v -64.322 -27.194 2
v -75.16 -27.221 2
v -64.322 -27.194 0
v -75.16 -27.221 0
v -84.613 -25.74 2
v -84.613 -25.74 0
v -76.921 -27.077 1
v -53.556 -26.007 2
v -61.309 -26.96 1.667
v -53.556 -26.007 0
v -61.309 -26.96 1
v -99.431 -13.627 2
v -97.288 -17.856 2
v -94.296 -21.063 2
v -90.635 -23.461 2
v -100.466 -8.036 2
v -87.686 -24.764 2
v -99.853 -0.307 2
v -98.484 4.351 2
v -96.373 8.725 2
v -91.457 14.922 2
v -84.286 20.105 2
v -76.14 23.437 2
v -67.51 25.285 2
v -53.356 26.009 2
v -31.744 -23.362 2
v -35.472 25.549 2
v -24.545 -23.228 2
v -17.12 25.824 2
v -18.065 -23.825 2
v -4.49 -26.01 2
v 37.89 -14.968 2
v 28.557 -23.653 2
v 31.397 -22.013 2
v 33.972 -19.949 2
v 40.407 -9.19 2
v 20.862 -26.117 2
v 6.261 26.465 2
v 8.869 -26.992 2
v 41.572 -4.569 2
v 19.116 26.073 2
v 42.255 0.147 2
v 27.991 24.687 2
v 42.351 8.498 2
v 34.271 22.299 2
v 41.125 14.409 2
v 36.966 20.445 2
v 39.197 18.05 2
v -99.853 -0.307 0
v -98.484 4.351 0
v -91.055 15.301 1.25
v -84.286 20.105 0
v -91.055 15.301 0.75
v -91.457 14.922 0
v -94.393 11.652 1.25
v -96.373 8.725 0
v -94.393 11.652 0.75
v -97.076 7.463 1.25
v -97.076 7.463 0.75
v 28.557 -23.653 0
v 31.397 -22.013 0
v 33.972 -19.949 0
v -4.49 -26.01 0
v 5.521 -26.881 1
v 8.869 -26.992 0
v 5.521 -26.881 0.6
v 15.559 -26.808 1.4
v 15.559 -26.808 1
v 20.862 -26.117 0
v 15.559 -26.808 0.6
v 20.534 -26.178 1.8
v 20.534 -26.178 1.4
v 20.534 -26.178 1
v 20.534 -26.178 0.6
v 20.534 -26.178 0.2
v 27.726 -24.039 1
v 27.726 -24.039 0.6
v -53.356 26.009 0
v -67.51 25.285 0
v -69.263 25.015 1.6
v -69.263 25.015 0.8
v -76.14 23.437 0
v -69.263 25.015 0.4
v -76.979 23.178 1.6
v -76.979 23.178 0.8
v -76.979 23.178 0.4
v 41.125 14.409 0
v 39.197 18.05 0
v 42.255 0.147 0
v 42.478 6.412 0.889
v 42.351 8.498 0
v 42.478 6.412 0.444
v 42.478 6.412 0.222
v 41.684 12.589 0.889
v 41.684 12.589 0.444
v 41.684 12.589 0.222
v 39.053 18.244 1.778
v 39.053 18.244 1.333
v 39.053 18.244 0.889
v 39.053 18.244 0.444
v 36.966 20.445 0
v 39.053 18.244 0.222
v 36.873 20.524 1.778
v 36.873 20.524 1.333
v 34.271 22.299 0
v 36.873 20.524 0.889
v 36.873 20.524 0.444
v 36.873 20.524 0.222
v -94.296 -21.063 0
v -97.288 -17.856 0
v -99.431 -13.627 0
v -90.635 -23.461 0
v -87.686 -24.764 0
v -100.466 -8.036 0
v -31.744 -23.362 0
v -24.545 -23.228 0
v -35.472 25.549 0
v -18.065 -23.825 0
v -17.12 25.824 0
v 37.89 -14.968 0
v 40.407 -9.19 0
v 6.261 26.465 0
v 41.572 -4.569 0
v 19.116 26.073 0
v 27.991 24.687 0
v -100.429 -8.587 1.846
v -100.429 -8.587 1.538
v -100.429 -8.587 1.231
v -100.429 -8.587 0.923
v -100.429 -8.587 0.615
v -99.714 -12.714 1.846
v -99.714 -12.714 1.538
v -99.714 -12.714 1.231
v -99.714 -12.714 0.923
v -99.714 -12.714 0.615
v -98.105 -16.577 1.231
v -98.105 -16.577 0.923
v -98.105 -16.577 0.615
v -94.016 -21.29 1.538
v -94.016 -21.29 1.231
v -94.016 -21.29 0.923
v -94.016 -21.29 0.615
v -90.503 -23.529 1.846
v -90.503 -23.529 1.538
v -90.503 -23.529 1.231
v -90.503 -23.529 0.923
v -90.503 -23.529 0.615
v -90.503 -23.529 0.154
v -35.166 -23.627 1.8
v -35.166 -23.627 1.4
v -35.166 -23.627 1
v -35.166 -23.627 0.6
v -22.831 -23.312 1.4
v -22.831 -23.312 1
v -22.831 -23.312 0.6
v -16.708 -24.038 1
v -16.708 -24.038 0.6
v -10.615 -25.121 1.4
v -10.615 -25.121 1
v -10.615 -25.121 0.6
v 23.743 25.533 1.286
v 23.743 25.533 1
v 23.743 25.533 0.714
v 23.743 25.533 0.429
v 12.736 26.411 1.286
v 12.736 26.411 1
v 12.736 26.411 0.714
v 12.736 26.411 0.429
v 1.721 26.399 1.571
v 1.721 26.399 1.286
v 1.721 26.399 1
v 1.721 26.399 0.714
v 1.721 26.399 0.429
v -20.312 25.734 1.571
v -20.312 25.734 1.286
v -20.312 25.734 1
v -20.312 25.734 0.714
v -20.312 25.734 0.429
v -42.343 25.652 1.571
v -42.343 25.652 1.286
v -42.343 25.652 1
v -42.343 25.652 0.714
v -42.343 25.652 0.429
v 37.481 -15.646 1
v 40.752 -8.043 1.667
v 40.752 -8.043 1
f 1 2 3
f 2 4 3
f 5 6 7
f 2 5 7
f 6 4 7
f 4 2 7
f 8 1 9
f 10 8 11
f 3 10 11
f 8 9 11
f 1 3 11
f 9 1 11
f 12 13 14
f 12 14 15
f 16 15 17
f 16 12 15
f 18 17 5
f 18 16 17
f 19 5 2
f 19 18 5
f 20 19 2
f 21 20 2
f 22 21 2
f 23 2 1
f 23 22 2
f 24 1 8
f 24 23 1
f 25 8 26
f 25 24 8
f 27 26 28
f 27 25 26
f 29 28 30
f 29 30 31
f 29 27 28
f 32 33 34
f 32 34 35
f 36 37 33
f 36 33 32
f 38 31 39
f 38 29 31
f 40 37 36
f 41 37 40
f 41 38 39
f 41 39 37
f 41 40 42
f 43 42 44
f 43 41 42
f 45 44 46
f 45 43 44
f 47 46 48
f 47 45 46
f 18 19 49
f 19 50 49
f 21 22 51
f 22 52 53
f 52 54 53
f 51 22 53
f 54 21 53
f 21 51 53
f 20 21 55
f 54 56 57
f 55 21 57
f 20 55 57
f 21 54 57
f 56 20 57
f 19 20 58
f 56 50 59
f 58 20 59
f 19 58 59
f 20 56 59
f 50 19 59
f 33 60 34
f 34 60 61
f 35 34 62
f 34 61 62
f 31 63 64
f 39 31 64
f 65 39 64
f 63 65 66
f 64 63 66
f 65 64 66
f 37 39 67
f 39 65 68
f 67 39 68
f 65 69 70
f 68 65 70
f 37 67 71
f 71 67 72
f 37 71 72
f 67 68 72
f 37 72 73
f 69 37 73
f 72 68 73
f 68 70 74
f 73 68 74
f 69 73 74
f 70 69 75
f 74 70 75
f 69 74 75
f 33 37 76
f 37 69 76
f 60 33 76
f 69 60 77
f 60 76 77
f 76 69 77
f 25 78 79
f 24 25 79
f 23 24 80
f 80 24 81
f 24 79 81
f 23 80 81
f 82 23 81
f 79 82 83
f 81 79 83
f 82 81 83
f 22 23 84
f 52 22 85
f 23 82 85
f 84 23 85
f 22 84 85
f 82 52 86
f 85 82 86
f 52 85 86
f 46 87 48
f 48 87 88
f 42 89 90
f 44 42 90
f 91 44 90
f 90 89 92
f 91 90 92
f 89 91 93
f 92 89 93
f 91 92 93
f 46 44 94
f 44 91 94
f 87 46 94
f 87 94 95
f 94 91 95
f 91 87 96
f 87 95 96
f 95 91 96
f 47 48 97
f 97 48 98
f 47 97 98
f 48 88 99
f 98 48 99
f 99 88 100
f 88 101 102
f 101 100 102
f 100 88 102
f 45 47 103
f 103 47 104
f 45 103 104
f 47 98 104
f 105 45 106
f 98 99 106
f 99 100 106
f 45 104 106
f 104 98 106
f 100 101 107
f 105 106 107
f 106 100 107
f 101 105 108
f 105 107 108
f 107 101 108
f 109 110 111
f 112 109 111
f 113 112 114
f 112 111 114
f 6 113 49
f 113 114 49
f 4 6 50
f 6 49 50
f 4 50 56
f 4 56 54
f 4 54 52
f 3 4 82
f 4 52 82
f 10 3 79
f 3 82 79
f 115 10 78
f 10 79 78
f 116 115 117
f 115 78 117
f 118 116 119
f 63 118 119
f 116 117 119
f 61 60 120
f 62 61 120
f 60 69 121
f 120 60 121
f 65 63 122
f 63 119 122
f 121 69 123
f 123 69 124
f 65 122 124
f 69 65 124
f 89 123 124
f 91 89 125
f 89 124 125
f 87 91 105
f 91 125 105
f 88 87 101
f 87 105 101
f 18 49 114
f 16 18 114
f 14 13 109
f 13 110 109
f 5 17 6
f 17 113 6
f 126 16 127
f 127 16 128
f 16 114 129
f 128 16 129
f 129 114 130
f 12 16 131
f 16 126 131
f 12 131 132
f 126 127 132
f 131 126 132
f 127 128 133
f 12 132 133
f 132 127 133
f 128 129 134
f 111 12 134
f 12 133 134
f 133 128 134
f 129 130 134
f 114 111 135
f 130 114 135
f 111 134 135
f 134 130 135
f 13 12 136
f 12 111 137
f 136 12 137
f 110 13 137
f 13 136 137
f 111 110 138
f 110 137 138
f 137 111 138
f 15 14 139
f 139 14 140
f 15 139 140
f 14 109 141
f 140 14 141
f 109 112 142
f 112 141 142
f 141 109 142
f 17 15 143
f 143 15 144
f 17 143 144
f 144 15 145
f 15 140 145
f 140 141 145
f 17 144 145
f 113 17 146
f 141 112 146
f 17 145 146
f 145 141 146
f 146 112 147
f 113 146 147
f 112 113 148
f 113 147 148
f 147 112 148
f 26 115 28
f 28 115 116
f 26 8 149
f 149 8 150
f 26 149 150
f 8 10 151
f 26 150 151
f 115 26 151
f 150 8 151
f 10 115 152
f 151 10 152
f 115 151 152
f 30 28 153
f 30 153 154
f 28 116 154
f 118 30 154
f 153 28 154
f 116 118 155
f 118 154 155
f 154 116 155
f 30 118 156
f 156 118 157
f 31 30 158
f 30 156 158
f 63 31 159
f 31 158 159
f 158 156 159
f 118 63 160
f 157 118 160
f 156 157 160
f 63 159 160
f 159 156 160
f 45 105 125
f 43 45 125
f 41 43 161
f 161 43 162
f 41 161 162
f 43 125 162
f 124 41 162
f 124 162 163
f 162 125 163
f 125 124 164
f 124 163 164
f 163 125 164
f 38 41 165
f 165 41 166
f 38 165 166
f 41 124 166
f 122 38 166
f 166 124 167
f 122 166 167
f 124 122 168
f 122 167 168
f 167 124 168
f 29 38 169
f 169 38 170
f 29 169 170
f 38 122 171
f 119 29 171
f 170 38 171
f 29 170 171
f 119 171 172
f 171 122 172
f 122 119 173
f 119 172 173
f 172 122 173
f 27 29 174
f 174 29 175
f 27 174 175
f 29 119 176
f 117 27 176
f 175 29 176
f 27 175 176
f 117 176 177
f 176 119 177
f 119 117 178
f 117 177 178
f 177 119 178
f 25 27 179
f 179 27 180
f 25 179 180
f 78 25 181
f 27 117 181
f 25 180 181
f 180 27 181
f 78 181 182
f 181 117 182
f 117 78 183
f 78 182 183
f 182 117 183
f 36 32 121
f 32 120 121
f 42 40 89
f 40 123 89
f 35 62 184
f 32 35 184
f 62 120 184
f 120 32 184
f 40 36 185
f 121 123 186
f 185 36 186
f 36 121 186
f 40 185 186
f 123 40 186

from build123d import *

# Parameters (mm, degrees)
BOSS_EXTRUDE1_DEPTH = 2


with BuildPart() as part:
    # Sketch1 → Boss-Extrude1 (new body)
    with BuildSketch(Plane.XY):
        with BuildLine():
            add(Edge.make_bspline(
                [(42.254555433, 0.147491636), (42.357527928, 1.189654109), (42.429661522, 2.232689939), (42.50709154, 4.320654428), (42.51255676, 5.365578306), (42.442786882, 7.457711495), (42.367698351, 8.502293443), (42.114292364, 10.564097845), (41.937085255, 11.58438322), (41.430828506, 13.593034081), (41.099175069, 14.581958917), (40.21807674, 16.509553986), (39.685127794, 17.41062061), (38.736453804, 18.660893203), (38.395384144, 19.060783278), (37.662639186, 19.826206877), (37.275770546, 20.18645437), (36.067960398, 21.197855015), (35.196182138, 21.783754372), (34.270812785, 22.298516315)],
                knots=[0, 0, 0, 0, 0.125, 0.125, 0.25, 0.25, 0.375, 0.375, 0.5, 0.5, 0.625, 0.625, 0.75, 0.75, 0.8125, 0.8125, 0.875, 0.875, 1, 1, 1, 1], degree=3))
            add(Edge.make_bspline(
                [(34.270812785, 22.298516315), (33.45091286, 22.754608011), (32.610347852, 23.1435514), (30.899496832, 23.82486392), (30.029089503, 24.116838846), (27.384412134, 24.88405503), (25.576662512, 25.251639126), (21.909570483, 25.814621969), (20.0753308, 26.005227958), (16.406035598, 26.27954802), (14.570970807, 26.362047301), (10.900331001, 26.4601954), (9.06475148, 26.475254024), (5.393277351, 26.464088036), (3.557380256, 26.437537651), (-1.950579769, 26.322675756), (-5.622906828, 26.199757695), (-12.967559425, 25.954120765), (-16.639869453, 25.830255047), (-23.984199611, 25.63861252), (-27.656235207, 25.570366288), (-34.999851743, 25.5306977), (-38.671433692, 25.559060601), (-43.260530776, 25.675514463), (-44.178331243, 25.702840848), (-46.013892062, 25.766036726), (-46.93165263, 25.801860059), (-49.684941646, 25.90777277), (-51.520481355, 25.975464081), (-53.356182015, 26.008878987)],
                knots=[0, 0, 0, 0, 0.03125, 0.03125, 0.0625, 0.0625, 0.125, 0.125, 0.1875, 0.1875, 0.25, 0.25, 0.3125, 0.3125, 0.375, 0.375, 0.5, 0.5, 0.625, 0.625, 0.75, 0.75, 0.875, 0.875, 0.90625, 0.90625, 0.9375, 0.9375, 1, 1, 1, 1], degree=3))
            add(Edge.make_bspline(
                [(-53.356182015, 26.008878987), (-56.017284847, 26.057318531), (-58.67724197, 26.03660848), (-63.99279506, 25.731969361), (-66.637523426, 25.454977459), (-70.576071928, 24.795289884), (-71.878758496, 24.535193979), (-74.451881384, 23.926274503), (-75.723701138, 23.577253526), (-79.488833317, 22.378061694), (-81.932756658, 21.378597323), (-84.285903477, 20.104733327)],
                knots=[0, 0, 0, 0, 0.25, 0.25, 0.5, 0.5, 0.625, 0.625, 0.75, 0.75, 1, 1, 1, 1], degree=3))
            add(Edge.make_bspline(
                [(-84.285903477, 20.104733327), (-86.243668655, 19.04490716), (-88.089328033, 17.819942875), (-90.230085424, 16.043743516), (-90.648741369, 15.677034404), (-91.461012999, 14.925425227), (-91.855498364, 14.539810344), (-93.003741638, 13.353314641), (-93.722322166, 12.522812605), (-95.063439745, 10.780934854), (-95.685998708, 9.869577587), (-96.545075204, 8.439588178), (-96.818228201, 7.953420385), (-97.332937593, 6.972523784), (-97.575368205, 6.476373625), (-98.714832207, 3.96785142), (-99.396532307, 1.873209654), (-99.85314935, -0.307426804)],
                knots=[0, 0, 0, 0, 0.25, 0.25, 0.3125, 0.3125, 0.375, 0.375, 0.5, 0.5, 0.625, 0.625, 0.6875, 0.6875, 0.75, 0.75, 1, 1, 1, 1], degree=3))
            add(Edge.make_bspline(
                [(-99.85314935, -0.307426804), (-100.14051455, -1.679778191), (-100.331986994, -3.055968901), (-100.528564311, -5.815812043), (-100.53708908, -7.199327552), (-100.402537913, -8.934535692), (-100.368287375, -9.281871208), (-100.283421356, -9.977197456), (-100.232649746, -10.326034758), (-100.055206061, -11.363139778), (-99.903283497, -12.04419862), (-99.525579806, -13.383595412), (-99.29967189, -14.04189436), (-98.764969227, -15.332994025), (-98.453321931, -15.970026404), (-97.409175926, -17.7896486), (-96.565970976, -18.891117915), (-95.090785963, -20.383706122), (-94.562489524, -20.855363909), (-93.469619231, -21.72400101), (-92.901743324, -22.124781656), (-91.729150022, -22.868715032), (-91.124315887, -23.211685156), (-89.881965149, -23.846503081), (-89.242471007, -24.139085478), (-87.298729798, -24.941242749), (-85.968550779, -25.377452728), (-84.61265543, -25.739877353)],
                knots=[0, 0, 0, 0, 0.125, 0.125, 0.25, 0.25, 0.28125, 0.28125, 0.3125, 0.3125, 0.375, 0.375, 0.4375, 0.4375, 0.5, 0.5, 0.625, 0.625, 0.6875, 0.6875, 0.75, 0.75, 0.8125, 0.8125, 0.875, 0.875, 1, 1, 1, 1], degree=3))
            add(Edge.make_bspline(
                [(-84.61265543, -25.739877353), (-83.350370047, -26.077280463), (-82.076564561, -26.347582858), (-79.51123721, -26.78499571), (-78.219675123, -26.951871889), (-74.323455793, -27.327077564), (-71.717759973, -27.410050866), (-66.500869096, -27.345401316), (-63.900066532, -27.196684894), (-60.012726683, -26.842340554), (-58.718943158, -26.702054489), (-56.134993667, -26.381307565), (-54.845196518, -26.196750811), (-53.555839789, -26.007302967)],
                knots=[0, 0, 0, 0, 0.125, 0.125, 0.25, 0.25, 0.5, 0.5, 0.75, 0.75, 0.875, 0.875, 1, 1, 1, 1], degree=3))
            add(Edge.make_bspline(
                [(-53.555839789, -26.007302967), (-49.478043597, -25.408143959), (-45.400438467, -24.807613645), (-39.264753562, -24.045176184), (-37.217430777, -23.814464467), (-33.115426536, -23.440382029), (-31.060733362, -23.296600048), (-26.938073638, -23.164600448), (-24.8802971, -23.179379937), (-21.807089534, -23.37778787), (-20.784687654, -23.473227264), (-18.743651668, -23.719292696), (-17.725028524, -23.870079287), (-15.690116591, -24.20584378), (-14.675159008, -24.39010391), (-12.645691165, -24.760512872), (-11.631034408, -24.946195442), (-9.598222133, -25.295883521), (-8.580063191, -25.459867825), (-6.538833416, -25.757404146), (-5.515772475, -25.891017449), (-4.490374877, -26.010153675)],
                knots=[0, 0, 0, 0, 0.25, 0.25, 0.375, 0.375, 0.5, 0.5, 0.625, 0.625, 0.6875, 0.6875, 0.75, 0.75, 0.8125, 0.8125, 0.875, 0.875, 0.9375, 0.9375, 1, 1, 1, 1], degree=3))
            add(Edge.make_bspline(
                [(-4.490374877, -26.010153675), (-2.827423356, -26.220643358), (-1.160922379, -26.389546162), (2.176076989, -26.680516402), (3.846836603, -26.799523252), (7.194684015, -26.963393321), (8.869254594, -27.008294551), (12.215566288, -26.995364126), (13.887893581, -26.937900459), (16.394628289, -26.743606591), (17.230196709, -26.660641197), (18.889496465, -26.452818507), (19.714480605, -26.327914327), (22.173015814, -25.879334814), (23.790417112, -25.482995845), (26.170541832, -24.681619244), (26.960177466, -24.377817584), (28.492185655, -23.700027284), (29.23620247, -23.325866653), (31.396242612, -22.087887163), (32.740155177, -21.108409582), (33.971856948, -19.948956682)],
                knots=[0, 0, 0, 0, 0.125, 0.125, 0.25, 0.25, 0.375, 0.375, 0.5, 0.5, 0.5625, 0.5625, 0.625, 0.625, 0.75, 0.75, 0.8125, 0.8125, 0.875, 0.875, 1, 1, 1, 1], degree=3))
            add(Edge.make_bspline(
                [(33.971856948, -19.948956682), (34.651256548, -19.309409144), (35.281352636, -18.629385126), (36.449105521, -17.193447629), (36.987573495, -16.436290255), (38.469087983, -14.066821684), (39.254304834, -12.401797499), (40.215299226, -9.812822233), (40.499325301, -8.934520261), (41.003776196, -7.151095255), (41.223524471, -6.247959026), (41.797540589, -3.530359899), (42.07205568, -1.699549118), (42.254555433, 0.147491636)],
                knots=[0, 0, 0, 0, 0.125, 0.125, 0.25, 0.25, 0.5, 0.5, 0.625, 0.625, 0.75, 0.75, 1, 1, 1, 1], degree=3))
        make_face()
    extrude(amount=BOSS_EXTRUDE1_DEPTH)


solid = part.part
